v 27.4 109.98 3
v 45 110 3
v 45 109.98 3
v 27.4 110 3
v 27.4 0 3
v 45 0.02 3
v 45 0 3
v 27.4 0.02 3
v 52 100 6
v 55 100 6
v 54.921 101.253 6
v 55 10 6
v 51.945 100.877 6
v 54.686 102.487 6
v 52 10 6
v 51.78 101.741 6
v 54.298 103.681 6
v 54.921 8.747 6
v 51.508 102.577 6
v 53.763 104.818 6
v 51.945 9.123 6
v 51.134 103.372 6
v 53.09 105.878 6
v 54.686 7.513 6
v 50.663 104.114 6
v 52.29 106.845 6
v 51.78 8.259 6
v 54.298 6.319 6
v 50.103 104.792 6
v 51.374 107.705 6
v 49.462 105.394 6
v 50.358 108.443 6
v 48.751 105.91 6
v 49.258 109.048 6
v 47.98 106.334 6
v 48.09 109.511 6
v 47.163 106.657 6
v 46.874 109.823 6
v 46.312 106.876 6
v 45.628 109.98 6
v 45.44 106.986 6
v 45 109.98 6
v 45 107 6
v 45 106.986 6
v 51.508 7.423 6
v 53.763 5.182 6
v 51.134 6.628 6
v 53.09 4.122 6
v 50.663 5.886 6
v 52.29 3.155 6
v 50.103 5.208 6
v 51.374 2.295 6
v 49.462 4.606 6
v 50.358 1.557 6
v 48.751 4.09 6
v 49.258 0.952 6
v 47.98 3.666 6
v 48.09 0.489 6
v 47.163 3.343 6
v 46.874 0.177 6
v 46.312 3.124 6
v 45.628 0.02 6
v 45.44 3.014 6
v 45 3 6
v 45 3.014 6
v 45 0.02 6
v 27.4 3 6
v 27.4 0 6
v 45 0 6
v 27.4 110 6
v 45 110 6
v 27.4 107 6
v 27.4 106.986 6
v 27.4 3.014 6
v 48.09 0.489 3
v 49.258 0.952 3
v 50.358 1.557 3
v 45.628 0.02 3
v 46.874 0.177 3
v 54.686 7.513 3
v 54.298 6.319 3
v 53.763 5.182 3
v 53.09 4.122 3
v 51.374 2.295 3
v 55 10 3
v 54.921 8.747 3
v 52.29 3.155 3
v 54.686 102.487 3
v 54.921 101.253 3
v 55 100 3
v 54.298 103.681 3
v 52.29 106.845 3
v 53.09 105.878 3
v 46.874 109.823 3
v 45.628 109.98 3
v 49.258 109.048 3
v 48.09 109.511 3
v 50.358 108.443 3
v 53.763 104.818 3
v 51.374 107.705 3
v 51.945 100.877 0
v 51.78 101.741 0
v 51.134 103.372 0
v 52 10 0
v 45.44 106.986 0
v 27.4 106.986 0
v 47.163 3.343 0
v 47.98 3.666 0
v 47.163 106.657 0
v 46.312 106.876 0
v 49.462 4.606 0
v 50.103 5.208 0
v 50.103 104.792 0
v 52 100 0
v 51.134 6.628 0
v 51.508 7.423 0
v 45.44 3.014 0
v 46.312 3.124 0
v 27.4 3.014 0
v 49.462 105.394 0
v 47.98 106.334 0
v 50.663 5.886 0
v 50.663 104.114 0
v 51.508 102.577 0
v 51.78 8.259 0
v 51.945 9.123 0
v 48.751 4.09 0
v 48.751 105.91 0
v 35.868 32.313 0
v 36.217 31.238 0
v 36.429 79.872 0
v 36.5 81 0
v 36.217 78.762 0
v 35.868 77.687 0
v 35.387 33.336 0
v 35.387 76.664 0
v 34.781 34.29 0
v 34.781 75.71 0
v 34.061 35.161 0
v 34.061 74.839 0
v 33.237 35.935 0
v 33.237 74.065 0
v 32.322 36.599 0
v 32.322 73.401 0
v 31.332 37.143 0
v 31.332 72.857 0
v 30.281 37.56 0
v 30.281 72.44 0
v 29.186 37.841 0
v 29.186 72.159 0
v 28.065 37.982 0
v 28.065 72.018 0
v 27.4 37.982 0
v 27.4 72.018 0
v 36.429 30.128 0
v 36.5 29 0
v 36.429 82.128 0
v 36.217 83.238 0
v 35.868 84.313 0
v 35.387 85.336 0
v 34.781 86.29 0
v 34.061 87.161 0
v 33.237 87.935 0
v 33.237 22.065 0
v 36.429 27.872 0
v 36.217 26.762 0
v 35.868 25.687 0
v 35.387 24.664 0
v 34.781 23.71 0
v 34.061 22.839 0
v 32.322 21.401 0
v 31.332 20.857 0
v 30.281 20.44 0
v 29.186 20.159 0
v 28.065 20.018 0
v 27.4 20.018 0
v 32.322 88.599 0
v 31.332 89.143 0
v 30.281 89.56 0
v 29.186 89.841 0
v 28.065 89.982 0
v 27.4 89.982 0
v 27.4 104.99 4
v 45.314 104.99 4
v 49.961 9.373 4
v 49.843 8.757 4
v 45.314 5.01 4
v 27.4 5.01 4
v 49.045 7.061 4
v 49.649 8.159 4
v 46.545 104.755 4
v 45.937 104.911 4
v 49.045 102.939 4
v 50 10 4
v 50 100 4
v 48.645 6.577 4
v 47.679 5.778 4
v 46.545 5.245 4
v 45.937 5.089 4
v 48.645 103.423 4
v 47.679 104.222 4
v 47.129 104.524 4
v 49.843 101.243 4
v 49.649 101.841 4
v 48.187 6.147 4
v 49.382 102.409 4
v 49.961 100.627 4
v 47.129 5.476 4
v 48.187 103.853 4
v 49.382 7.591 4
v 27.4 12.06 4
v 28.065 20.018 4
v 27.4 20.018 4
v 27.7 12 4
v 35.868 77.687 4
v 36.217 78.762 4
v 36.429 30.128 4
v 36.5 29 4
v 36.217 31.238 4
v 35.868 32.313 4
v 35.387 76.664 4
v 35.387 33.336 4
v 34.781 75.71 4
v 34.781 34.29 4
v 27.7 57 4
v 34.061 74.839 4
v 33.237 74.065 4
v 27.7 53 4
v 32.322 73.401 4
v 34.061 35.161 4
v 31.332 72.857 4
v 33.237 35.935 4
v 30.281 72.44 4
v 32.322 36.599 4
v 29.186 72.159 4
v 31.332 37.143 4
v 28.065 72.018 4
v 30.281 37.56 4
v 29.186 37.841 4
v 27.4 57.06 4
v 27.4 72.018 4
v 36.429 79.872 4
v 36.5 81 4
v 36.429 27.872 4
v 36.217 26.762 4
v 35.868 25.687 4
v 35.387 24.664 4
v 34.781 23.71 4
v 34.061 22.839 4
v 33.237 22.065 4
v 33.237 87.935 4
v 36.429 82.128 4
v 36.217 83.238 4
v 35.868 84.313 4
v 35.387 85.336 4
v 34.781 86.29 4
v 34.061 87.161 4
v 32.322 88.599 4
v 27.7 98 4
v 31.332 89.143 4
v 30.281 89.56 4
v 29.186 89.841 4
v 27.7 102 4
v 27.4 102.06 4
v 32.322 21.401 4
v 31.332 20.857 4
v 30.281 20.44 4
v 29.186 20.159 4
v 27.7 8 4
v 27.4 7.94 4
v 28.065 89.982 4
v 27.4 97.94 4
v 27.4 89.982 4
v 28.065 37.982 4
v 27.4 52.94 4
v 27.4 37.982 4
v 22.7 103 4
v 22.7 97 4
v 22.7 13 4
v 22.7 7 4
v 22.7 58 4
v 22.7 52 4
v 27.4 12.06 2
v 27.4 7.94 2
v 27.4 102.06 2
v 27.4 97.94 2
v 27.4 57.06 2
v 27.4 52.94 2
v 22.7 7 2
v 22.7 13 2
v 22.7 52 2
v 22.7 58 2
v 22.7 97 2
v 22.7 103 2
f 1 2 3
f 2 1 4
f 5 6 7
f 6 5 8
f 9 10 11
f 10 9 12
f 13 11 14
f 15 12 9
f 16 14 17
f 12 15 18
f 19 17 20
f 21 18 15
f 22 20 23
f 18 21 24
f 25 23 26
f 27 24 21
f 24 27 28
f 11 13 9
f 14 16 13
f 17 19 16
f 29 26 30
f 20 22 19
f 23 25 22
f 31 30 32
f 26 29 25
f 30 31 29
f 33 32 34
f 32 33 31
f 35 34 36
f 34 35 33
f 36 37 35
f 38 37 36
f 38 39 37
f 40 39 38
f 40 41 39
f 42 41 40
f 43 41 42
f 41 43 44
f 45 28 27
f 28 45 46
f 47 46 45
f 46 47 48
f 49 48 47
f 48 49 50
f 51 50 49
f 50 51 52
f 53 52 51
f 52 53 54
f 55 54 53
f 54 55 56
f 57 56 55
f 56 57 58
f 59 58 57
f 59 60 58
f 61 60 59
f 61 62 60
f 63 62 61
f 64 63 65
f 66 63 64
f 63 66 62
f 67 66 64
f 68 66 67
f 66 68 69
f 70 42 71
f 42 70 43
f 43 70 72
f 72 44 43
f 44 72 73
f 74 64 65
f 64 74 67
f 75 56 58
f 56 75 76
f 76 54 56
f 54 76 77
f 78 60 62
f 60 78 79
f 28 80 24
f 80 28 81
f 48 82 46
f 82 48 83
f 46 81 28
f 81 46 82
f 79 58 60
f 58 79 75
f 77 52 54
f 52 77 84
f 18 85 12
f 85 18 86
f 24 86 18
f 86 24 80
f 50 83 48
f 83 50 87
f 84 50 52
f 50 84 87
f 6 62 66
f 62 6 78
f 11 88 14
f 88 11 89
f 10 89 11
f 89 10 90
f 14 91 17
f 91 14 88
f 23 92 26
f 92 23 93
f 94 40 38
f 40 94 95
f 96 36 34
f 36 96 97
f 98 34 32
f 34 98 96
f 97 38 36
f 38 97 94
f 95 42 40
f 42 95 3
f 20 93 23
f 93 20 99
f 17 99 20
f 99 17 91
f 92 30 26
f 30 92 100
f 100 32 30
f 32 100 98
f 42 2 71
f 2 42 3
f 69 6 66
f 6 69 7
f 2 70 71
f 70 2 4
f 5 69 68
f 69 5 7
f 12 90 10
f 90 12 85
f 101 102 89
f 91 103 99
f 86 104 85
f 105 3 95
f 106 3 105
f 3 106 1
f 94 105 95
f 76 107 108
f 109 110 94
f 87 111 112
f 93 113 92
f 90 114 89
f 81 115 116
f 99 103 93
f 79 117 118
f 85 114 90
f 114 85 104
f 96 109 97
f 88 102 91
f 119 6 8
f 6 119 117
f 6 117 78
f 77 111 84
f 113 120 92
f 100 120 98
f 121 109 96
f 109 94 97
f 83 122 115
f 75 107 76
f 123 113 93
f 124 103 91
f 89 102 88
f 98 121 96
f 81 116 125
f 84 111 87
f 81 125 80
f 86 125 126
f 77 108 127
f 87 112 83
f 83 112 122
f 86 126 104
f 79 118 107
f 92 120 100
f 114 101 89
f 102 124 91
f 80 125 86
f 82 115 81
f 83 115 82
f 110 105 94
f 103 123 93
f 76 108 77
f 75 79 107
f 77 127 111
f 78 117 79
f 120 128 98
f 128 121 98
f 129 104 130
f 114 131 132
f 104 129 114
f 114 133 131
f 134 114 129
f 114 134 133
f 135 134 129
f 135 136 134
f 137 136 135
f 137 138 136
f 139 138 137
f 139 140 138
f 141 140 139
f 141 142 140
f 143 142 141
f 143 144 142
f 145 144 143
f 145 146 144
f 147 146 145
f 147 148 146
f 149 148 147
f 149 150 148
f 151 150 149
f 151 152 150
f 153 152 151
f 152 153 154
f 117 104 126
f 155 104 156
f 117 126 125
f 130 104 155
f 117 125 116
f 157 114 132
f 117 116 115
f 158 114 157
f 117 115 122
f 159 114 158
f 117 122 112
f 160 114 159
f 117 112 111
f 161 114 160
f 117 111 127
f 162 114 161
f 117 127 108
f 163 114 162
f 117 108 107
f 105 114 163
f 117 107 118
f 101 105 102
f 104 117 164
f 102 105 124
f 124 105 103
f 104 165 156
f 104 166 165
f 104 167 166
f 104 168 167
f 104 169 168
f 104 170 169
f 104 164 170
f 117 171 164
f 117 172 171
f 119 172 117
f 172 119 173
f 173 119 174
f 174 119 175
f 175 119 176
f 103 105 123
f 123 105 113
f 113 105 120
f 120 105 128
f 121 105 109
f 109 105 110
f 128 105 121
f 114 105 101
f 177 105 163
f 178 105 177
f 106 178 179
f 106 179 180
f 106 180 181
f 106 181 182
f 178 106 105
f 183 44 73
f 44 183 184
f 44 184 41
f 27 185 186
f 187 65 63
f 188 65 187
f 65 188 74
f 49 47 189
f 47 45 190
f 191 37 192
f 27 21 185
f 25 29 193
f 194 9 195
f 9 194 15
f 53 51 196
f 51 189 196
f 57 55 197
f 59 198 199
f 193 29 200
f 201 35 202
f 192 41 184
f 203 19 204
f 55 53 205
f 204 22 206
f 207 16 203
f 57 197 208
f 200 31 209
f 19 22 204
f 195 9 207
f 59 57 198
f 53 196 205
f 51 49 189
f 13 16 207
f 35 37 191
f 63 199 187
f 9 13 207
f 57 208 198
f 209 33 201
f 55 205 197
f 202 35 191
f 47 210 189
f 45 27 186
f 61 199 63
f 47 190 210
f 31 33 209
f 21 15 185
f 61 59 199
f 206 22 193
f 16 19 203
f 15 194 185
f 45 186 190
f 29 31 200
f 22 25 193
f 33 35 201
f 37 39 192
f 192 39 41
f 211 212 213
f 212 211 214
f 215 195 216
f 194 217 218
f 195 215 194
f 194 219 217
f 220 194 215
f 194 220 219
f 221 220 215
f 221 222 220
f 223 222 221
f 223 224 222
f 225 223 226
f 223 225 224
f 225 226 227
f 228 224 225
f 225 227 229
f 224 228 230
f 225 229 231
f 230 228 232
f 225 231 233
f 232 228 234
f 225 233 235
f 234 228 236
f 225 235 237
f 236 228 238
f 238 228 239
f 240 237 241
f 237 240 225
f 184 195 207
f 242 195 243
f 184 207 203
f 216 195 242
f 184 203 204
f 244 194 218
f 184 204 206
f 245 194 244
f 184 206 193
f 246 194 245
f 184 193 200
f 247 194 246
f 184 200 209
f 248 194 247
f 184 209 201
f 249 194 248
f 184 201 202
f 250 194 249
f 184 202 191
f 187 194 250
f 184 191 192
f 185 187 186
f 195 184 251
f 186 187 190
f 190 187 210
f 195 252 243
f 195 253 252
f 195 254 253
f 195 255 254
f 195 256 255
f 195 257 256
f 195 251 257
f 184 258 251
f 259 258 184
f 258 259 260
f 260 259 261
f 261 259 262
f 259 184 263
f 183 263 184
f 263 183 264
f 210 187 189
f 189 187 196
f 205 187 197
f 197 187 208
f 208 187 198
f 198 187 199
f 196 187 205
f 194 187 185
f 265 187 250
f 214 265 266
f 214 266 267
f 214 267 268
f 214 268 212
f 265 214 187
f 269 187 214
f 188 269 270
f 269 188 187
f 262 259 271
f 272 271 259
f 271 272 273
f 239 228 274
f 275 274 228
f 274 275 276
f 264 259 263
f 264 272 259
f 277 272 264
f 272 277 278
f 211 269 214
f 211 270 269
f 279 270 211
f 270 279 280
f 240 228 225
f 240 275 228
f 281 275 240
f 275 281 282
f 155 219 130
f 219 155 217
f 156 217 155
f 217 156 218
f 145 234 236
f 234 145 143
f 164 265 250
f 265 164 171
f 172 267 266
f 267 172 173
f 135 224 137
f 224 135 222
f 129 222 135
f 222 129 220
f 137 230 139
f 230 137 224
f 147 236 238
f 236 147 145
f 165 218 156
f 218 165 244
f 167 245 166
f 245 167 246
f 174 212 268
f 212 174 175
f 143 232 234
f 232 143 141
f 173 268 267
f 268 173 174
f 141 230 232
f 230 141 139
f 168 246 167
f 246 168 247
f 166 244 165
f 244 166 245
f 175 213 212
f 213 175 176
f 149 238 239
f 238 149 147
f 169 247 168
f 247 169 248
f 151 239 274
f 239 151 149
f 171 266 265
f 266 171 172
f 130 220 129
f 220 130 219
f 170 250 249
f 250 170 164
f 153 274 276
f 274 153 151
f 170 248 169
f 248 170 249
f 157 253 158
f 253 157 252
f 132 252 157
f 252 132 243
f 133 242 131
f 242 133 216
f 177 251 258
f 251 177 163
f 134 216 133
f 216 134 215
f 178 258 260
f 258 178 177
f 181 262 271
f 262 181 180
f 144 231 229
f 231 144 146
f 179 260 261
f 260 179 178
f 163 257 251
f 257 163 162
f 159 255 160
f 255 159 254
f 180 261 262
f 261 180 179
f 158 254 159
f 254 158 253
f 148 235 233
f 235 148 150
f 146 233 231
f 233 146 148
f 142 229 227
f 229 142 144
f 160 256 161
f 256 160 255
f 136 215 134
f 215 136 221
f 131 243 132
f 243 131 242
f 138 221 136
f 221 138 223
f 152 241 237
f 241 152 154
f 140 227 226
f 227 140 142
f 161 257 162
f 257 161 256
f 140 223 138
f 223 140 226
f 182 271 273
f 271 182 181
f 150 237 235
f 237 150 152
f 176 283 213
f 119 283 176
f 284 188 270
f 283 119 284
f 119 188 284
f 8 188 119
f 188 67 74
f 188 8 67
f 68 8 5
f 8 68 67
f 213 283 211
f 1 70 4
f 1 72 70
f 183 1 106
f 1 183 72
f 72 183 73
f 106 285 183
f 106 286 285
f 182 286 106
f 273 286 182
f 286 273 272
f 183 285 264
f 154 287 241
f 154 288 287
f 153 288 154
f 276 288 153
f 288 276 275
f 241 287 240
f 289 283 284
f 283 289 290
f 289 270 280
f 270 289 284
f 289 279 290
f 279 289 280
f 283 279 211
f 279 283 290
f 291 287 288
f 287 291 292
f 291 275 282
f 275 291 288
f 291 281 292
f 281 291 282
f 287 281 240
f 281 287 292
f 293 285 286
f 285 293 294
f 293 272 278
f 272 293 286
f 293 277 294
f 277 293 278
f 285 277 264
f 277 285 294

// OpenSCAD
// file: toilet_ground_floor_config.scad
use <./_cfg.scad>

// Toilet Ground Floor Configuration Functions
function get_h() = 6;
function get_width() = 55;
function get_length() = 110;
function get_diameter() = 18;
function get_distance() = 52;
function get_nutDistance() = 10;
function get_separation() = 10;
function get_offset_l() = 0;
function get_offset_r() = 0;
// file: _cfg.scad
// Global configuration functions
function get_fn() = 50;
function get_darft() = false;
// file: base.scad
module base(h, width, length, diameter, distance, offset_l=0, offset_r=0, fn) {
    corner_radius=10;

    difference() {
        union() {
            difference() {
                _base_plate_shape(corner_radius, h, width, length, fn);
                translate([3,3,h-2]) {
                    offset=3;
                    _base_plate_shape(corner_radius-offset, h-2, width-offset*2, length-offset*2, fn);
                }
            }
        }

        translate([width/2, length/2-distance/2, -.1]) {
            translate([offset_l, 0, 0])
            cylinder(d=diameter, h=h+.2, center=false, $fn=fn);
            translate([offset_r, distance, 0]) {
                cylinder(d=diameter, h=h+.2, center=false, $fn=fn);
            }
        }
    }
}

module rounded_top_only(corner_radius, h, width, length, fn) {
    minkowski() {
        _base_plate_shape(corner_radius, h - corner_radius, width, length, fn);
        translate([0, 0, corner_radius]) cylinder(r=corner_radius/2, h=0.001, $fn=fn);
    }
}

module _base_plate_shape(corner_radius, h, width, length, fn) {
    hs=h/2;
    hn=h-hs;

    translate([0, 0, hs])

    union() {
        translate([corner_radius, 0, 0])
            cube([width - corner_radius * 2, length, hn], center=false);

        translate([0, corner_radius, 0])
            cube([width, length - corner_radius * 2, hn], center=false);

        for (x = [corner_radius, width - corner_radius])
        for (y = [corner_radius, length - corner_radius])
        translate([x, y, 0])
            cylinder(d = corner_radius * 2, h = hn, center = false, $fn = fn);

        // -------

        hull() {
            for (x = [corner_radius, width - corner_radius])
            for (y = [corner_radius, length - corner_radius])
            translate([x, y, 0])
                translate([0, 0, -hs])
                    cylinder(r1=corner_radius-hs, r2=corner_radius, h = hs, center = false, $fn = fn);
        }
    }
}

module nut(h,extend=0) {
    nut_height=h;
    nut_width=5+extend;
    nut_length=4+extend;
    nut_length_=1+extend;
    rotate([0,0,90]) {
        translate([-nut_length/2,0,0]) {
            linear_extrude(height=nut_height)
                polygon(points=[[0,0], [-nut_length_,nut_width], [0,nut_width]]);

            translate([nut_length,0,0]) {
                linear_extrude(height=nut_height)
                    polygon(points=[[0,0], [nut_length_,nut_width], [0,nut_width]]);
            }

            cube([nut_length, nut_width, nut_height], center=false);
        }
    }
}

module both(h, width, length, diameter, distance, nutDistance, separation, offset_l=0, offset_r=0, fn) {
    left(h, width, length, diameter, distance, nutDistance, offset_l, offset_r, fn);

    translate([-separation, 0, 0])
        right(h, width, length, diameter, distance, nutDistance, offset_l, offset_r, fn);
}

module left(h, width, length, diameter, distance, nutDistance, offset_l=0, offset_r=0, fn) {
    union() {
        translate([0, 0, 0]) {
            difference() {
                base(h, width, length, diameter, distance, offset_l, offset_r, fn);
                translate([-.1, -.1, -.1]) {
                    cube([width / 2, length + .2, h + .2], center = false);
                }
            }
        }

        translate([0.2,0,2])
            translate([width / 2, 0, 0]) {
                translate([0, nutDistance, 0]) {
                    nut(h - 4);
                }
                translate([0, length / 2, 0]) {
                    nut(h - 4);
                }
                translate([0, length - nutDistance, 0]) {
                    nut(h - 4);
                }
            }
    }
}

module right(h, width, length, diameter, distance, nutDistance, offset_l=0, offset_r=0, fn) {
    difference() {
        union() {
            difference() {
                base(h, width, length, diameter, distance, offset_l, offset_r, fn);
                translate([width / 2 + .1, -.1, -.1]) {
                    cube([width / 2, length + .2, h + .2], center = false);
                }
            }
        }

        translate([0.2,0,1.5])
            translate([width / 2 , 0, -.1]) {
                translate([0, nutDistance, 0]) {
                    nut(h - 1.3, extend = .2);
                }
                translate([0, length / 2, 0]) {
                    nut(h - 1.3, extend = .2);
                }
                translate([0, length - nutDistance, 0]) {
                    nut(h - 1.3, extend =  .2);
                }
            }
    }
}
// main file
use <./base.scad>
use <./_cfg.scad>
use <./toilet_ground_floor_config.scad>

left(h=get_h(),
width=get_width(),
length=get_length(),
diameter=get_diameter(),
distance=get_distance(),
nutDistance=get_nutDistance(),
offset_l=get_offset_l(),
offset_r=get_offset_r(),
fn=get_fn()
);
